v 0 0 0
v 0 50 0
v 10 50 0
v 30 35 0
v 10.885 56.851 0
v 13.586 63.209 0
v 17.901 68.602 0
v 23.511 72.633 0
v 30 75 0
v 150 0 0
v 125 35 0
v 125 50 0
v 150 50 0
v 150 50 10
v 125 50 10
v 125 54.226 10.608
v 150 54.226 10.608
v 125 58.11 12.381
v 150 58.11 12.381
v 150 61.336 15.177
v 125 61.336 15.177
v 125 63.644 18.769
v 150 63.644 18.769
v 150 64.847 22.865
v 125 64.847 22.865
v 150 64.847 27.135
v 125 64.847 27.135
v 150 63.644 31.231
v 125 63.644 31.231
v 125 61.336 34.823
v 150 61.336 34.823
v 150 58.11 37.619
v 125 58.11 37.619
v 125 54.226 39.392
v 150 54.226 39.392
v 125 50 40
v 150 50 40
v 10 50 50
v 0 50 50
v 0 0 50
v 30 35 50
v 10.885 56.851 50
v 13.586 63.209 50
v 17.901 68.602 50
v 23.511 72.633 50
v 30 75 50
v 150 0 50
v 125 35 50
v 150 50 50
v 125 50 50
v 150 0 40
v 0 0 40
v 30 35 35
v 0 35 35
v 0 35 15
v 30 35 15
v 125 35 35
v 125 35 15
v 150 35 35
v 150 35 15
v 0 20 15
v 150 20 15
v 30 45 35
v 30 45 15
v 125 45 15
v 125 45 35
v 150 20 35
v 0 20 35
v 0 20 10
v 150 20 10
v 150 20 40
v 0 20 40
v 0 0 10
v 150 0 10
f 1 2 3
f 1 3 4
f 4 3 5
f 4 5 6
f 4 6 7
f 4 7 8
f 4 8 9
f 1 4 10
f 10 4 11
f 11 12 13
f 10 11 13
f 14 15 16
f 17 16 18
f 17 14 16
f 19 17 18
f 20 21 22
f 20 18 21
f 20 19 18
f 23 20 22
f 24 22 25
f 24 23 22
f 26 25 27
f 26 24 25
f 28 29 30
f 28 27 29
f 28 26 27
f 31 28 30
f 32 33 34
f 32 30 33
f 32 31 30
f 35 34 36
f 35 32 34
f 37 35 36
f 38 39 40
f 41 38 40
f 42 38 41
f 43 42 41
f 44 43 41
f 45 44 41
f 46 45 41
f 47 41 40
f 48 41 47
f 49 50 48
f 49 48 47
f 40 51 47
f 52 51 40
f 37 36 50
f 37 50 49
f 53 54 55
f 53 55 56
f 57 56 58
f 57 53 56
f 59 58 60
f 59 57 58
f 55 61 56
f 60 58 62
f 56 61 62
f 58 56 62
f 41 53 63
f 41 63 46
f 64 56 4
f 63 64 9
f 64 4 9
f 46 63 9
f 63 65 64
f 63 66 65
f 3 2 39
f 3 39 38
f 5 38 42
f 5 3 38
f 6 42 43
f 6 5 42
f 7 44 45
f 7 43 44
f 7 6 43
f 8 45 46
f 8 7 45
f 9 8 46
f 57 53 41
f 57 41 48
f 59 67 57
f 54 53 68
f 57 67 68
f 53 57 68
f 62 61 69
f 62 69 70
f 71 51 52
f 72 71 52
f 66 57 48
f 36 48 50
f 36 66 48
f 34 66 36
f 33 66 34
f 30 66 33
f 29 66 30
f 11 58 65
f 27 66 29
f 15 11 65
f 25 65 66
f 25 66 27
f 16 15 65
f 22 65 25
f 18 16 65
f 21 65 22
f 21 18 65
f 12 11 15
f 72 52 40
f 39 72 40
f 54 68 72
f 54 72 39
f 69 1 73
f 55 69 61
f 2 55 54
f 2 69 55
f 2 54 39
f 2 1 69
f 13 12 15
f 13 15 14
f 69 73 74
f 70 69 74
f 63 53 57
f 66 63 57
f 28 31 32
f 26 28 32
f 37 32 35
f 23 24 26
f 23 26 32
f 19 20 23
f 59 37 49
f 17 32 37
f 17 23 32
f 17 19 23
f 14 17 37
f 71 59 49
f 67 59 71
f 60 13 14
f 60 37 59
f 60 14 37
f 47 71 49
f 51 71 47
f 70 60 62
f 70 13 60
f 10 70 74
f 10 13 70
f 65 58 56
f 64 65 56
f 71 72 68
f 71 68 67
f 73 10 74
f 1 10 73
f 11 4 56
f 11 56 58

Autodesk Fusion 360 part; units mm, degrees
sketch "Sketch1" plane through (0, 0, 0) normal (0, 0, 1) x (1, 0, 0)
  line L0 (0, 0) -> (0, 50)
  line L1 (0, 50) -> (10, 50)
  line L2 (30, 50) -> (30, 75)
  line L3 (30, 75) -> (30, 35)
  arc A0 (30, 75) -> (10, 50) centre (35.3698, 50.2041) ccw
  line L4 (30, 35) -> (125, 35)
  line L5 (125, 35) -> (125, 50)
  line L6 (125, 50) -> (150, 50)
  line L7 (150, 50) -> (150, 0)
  line L8 (150, 0) -> (0, 0)
extrude "Extrude1" add sketch "Sketch1" along normal blind 50
sketch "Sketch2" plane through (150, 0, 0) normal (1, 0, 0) x (0, 1, 0)
  line L0 (0, 0) -> (50, 0)
  line L1 (50, 0) -> (50, 50)
  line L2 (50, 50) -> (0, 50)
  line L3 (0, 50) -> (0, 0)
  circle A0 centre (50, 25) radius 15
extrude "Extrude2" add sketch "Sketch2" against normal blind 25 contours L1 A0 picked at (54.9491, 25.7116)
sketch "Sketch3" plane through (0, 35, 0) normal (0, 1, 0) x (-1, 0, 0)
  line L0 (-125, 0) -> (-30, 0)
  line L1 (-30, 0) -> (-30, 50)
  line L2 (-30, 50) -> (-125, 50)
  line L3 (-125, 50) -> (-125, 0)
  line L4 (-125, 15) -> (-30, 15)
  line L5 (-30, 15) -> (-30, 35)
  line L6 (-30, 35) -> (-125, 35)
  line L7 (-125, 35) -> (-125, 15)
extrude "Extrude3" add sketch "Sketch3" along normal blind 10 contours L1 L3 L4 L5 L6 L7
sketch "Sketch4" plane through (0, 0, 0) normal (0, -1, 0) x (1, 0, 0)
  line L0 (0, 0) -> (150, 0)
  line L1 (150, 0) -> (150, 50)
  line L2 (150, 50) -> (0, 50)
  line L3 (0, 50) -> (0, 0)
  line L4 (0, 10) -> (150, 10)
  line L5 (150, 10) -> (150, 40)
  line L6 (150, 40) -> (0, 40)
  line L7 (0, 40) -> (0, 10)
  line L8 (150, 35) -> (0, 35)
  line L9 (0, 35) -> (0, 15)
  line L10 (0, 15) -> (150, 15)
  line L11 (150, 15) -> (150, 35)
extrude "Extrude4" cut sketch "Sketch4" against normal blind 35 contours L1 L3 L5 L7 L8 L9 L10 L11
extrude "Extrude5" cut sketch "Sketch4" against normal blind 20 contours L1 L3 L4 L5 L7 L10 | L1 L3 L5 L6 L7 L8
